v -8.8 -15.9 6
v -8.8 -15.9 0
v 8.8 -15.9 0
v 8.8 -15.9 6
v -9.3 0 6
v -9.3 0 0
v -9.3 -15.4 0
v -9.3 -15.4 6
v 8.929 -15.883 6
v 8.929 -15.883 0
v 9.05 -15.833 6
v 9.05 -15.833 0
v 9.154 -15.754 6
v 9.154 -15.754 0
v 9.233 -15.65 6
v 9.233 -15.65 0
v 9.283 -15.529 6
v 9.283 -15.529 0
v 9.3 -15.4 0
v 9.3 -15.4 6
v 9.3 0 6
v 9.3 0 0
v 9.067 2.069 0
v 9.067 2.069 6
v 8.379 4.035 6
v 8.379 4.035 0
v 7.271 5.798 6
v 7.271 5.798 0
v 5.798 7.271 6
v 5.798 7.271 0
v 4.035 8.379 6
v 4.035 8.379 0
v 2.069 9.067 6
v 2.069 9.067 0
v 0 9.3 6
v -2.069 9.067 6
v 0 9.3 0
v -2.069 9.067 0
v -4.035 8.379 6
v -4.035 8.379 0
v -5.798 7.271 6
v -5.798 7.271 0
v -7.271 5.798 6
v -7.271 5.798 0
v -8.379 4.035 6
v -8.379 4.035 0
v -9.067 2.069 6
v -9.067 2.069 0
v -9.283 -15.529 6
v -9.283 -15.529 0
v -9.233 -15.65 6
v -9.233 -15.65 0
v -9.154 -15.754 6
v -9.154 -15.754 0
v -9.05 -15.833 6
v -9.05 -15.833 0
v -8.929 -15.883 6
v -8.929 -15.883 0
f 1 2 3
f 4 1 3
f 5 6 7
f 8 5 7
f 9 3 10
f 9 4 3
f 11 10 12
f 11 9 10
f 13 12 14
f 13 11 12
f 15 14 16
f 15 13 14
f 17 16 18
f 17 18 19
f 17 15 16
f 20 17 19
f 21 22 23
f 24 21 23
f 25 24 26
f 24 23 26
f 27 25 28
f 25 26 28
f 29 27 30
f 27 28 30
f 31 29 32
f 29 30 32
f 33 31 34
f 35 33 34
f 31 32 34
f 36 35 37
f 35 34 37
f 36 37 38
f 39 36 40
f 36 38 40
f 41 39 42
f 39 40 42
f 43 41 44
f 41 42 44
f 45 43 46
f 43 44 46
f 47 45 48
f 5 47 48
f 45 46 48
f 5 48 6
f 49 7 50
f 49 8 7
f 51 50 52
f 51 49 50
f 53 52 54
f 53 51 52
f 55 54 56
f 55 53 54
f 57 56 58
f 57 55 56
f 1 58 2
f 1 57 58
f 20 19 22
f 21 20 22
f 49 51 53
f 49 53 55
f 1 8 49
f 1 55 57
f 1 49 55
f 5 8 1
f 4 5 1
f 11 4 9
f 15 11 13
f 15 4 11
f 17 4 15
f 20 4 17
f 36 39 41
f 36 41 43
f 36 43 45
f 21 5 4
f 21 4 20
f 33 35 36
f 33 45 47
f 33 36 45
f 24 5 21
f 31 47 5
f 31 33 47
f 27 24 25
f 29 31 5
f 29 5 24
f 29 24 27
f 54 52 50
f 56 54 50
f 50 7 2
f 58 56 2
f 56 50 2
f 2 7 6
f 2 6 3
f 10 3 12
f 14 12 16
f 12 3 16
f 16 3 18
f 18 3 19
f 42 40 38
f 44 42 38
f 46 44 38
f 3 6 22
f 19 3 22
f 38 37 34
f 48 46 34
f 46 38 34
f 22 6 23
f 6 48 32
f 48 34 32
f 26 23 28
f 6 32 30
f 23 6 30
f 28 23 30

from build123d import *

# Parameters (mm, degrees)
EXTRUDE_1_DEPTH = 6
FILLET_1_R      = 0.5


with BuildPart() as part:
    # 草图1 → 凸台-拉伸1 (new body)
    with BuildSketch(Plane.XY):
        with BuildLine():
            Line((-9.3, 0), (-9.3, -15.9))
            Line((-9.3, -15.9), (9.3, -15.9))
            Line((9.3, -15.9), (9.3, 0))
            ThreePointArc((9.3, 0), (0, 9.3), (-9.3, 0))
        make_face()
    extrude(amount=EXTRUDE_1_DEPTH)

    # 圆角1
    fillet_1_edges = [part.edges().sort_by_distance(p)[0] for p in [
        (9.3, -15.9, 3),
        (-9.3, -15.9, 3),
    ]]
    fillet(fillet_1_edges, radius=FILLET_1_R)


solid = part.part
